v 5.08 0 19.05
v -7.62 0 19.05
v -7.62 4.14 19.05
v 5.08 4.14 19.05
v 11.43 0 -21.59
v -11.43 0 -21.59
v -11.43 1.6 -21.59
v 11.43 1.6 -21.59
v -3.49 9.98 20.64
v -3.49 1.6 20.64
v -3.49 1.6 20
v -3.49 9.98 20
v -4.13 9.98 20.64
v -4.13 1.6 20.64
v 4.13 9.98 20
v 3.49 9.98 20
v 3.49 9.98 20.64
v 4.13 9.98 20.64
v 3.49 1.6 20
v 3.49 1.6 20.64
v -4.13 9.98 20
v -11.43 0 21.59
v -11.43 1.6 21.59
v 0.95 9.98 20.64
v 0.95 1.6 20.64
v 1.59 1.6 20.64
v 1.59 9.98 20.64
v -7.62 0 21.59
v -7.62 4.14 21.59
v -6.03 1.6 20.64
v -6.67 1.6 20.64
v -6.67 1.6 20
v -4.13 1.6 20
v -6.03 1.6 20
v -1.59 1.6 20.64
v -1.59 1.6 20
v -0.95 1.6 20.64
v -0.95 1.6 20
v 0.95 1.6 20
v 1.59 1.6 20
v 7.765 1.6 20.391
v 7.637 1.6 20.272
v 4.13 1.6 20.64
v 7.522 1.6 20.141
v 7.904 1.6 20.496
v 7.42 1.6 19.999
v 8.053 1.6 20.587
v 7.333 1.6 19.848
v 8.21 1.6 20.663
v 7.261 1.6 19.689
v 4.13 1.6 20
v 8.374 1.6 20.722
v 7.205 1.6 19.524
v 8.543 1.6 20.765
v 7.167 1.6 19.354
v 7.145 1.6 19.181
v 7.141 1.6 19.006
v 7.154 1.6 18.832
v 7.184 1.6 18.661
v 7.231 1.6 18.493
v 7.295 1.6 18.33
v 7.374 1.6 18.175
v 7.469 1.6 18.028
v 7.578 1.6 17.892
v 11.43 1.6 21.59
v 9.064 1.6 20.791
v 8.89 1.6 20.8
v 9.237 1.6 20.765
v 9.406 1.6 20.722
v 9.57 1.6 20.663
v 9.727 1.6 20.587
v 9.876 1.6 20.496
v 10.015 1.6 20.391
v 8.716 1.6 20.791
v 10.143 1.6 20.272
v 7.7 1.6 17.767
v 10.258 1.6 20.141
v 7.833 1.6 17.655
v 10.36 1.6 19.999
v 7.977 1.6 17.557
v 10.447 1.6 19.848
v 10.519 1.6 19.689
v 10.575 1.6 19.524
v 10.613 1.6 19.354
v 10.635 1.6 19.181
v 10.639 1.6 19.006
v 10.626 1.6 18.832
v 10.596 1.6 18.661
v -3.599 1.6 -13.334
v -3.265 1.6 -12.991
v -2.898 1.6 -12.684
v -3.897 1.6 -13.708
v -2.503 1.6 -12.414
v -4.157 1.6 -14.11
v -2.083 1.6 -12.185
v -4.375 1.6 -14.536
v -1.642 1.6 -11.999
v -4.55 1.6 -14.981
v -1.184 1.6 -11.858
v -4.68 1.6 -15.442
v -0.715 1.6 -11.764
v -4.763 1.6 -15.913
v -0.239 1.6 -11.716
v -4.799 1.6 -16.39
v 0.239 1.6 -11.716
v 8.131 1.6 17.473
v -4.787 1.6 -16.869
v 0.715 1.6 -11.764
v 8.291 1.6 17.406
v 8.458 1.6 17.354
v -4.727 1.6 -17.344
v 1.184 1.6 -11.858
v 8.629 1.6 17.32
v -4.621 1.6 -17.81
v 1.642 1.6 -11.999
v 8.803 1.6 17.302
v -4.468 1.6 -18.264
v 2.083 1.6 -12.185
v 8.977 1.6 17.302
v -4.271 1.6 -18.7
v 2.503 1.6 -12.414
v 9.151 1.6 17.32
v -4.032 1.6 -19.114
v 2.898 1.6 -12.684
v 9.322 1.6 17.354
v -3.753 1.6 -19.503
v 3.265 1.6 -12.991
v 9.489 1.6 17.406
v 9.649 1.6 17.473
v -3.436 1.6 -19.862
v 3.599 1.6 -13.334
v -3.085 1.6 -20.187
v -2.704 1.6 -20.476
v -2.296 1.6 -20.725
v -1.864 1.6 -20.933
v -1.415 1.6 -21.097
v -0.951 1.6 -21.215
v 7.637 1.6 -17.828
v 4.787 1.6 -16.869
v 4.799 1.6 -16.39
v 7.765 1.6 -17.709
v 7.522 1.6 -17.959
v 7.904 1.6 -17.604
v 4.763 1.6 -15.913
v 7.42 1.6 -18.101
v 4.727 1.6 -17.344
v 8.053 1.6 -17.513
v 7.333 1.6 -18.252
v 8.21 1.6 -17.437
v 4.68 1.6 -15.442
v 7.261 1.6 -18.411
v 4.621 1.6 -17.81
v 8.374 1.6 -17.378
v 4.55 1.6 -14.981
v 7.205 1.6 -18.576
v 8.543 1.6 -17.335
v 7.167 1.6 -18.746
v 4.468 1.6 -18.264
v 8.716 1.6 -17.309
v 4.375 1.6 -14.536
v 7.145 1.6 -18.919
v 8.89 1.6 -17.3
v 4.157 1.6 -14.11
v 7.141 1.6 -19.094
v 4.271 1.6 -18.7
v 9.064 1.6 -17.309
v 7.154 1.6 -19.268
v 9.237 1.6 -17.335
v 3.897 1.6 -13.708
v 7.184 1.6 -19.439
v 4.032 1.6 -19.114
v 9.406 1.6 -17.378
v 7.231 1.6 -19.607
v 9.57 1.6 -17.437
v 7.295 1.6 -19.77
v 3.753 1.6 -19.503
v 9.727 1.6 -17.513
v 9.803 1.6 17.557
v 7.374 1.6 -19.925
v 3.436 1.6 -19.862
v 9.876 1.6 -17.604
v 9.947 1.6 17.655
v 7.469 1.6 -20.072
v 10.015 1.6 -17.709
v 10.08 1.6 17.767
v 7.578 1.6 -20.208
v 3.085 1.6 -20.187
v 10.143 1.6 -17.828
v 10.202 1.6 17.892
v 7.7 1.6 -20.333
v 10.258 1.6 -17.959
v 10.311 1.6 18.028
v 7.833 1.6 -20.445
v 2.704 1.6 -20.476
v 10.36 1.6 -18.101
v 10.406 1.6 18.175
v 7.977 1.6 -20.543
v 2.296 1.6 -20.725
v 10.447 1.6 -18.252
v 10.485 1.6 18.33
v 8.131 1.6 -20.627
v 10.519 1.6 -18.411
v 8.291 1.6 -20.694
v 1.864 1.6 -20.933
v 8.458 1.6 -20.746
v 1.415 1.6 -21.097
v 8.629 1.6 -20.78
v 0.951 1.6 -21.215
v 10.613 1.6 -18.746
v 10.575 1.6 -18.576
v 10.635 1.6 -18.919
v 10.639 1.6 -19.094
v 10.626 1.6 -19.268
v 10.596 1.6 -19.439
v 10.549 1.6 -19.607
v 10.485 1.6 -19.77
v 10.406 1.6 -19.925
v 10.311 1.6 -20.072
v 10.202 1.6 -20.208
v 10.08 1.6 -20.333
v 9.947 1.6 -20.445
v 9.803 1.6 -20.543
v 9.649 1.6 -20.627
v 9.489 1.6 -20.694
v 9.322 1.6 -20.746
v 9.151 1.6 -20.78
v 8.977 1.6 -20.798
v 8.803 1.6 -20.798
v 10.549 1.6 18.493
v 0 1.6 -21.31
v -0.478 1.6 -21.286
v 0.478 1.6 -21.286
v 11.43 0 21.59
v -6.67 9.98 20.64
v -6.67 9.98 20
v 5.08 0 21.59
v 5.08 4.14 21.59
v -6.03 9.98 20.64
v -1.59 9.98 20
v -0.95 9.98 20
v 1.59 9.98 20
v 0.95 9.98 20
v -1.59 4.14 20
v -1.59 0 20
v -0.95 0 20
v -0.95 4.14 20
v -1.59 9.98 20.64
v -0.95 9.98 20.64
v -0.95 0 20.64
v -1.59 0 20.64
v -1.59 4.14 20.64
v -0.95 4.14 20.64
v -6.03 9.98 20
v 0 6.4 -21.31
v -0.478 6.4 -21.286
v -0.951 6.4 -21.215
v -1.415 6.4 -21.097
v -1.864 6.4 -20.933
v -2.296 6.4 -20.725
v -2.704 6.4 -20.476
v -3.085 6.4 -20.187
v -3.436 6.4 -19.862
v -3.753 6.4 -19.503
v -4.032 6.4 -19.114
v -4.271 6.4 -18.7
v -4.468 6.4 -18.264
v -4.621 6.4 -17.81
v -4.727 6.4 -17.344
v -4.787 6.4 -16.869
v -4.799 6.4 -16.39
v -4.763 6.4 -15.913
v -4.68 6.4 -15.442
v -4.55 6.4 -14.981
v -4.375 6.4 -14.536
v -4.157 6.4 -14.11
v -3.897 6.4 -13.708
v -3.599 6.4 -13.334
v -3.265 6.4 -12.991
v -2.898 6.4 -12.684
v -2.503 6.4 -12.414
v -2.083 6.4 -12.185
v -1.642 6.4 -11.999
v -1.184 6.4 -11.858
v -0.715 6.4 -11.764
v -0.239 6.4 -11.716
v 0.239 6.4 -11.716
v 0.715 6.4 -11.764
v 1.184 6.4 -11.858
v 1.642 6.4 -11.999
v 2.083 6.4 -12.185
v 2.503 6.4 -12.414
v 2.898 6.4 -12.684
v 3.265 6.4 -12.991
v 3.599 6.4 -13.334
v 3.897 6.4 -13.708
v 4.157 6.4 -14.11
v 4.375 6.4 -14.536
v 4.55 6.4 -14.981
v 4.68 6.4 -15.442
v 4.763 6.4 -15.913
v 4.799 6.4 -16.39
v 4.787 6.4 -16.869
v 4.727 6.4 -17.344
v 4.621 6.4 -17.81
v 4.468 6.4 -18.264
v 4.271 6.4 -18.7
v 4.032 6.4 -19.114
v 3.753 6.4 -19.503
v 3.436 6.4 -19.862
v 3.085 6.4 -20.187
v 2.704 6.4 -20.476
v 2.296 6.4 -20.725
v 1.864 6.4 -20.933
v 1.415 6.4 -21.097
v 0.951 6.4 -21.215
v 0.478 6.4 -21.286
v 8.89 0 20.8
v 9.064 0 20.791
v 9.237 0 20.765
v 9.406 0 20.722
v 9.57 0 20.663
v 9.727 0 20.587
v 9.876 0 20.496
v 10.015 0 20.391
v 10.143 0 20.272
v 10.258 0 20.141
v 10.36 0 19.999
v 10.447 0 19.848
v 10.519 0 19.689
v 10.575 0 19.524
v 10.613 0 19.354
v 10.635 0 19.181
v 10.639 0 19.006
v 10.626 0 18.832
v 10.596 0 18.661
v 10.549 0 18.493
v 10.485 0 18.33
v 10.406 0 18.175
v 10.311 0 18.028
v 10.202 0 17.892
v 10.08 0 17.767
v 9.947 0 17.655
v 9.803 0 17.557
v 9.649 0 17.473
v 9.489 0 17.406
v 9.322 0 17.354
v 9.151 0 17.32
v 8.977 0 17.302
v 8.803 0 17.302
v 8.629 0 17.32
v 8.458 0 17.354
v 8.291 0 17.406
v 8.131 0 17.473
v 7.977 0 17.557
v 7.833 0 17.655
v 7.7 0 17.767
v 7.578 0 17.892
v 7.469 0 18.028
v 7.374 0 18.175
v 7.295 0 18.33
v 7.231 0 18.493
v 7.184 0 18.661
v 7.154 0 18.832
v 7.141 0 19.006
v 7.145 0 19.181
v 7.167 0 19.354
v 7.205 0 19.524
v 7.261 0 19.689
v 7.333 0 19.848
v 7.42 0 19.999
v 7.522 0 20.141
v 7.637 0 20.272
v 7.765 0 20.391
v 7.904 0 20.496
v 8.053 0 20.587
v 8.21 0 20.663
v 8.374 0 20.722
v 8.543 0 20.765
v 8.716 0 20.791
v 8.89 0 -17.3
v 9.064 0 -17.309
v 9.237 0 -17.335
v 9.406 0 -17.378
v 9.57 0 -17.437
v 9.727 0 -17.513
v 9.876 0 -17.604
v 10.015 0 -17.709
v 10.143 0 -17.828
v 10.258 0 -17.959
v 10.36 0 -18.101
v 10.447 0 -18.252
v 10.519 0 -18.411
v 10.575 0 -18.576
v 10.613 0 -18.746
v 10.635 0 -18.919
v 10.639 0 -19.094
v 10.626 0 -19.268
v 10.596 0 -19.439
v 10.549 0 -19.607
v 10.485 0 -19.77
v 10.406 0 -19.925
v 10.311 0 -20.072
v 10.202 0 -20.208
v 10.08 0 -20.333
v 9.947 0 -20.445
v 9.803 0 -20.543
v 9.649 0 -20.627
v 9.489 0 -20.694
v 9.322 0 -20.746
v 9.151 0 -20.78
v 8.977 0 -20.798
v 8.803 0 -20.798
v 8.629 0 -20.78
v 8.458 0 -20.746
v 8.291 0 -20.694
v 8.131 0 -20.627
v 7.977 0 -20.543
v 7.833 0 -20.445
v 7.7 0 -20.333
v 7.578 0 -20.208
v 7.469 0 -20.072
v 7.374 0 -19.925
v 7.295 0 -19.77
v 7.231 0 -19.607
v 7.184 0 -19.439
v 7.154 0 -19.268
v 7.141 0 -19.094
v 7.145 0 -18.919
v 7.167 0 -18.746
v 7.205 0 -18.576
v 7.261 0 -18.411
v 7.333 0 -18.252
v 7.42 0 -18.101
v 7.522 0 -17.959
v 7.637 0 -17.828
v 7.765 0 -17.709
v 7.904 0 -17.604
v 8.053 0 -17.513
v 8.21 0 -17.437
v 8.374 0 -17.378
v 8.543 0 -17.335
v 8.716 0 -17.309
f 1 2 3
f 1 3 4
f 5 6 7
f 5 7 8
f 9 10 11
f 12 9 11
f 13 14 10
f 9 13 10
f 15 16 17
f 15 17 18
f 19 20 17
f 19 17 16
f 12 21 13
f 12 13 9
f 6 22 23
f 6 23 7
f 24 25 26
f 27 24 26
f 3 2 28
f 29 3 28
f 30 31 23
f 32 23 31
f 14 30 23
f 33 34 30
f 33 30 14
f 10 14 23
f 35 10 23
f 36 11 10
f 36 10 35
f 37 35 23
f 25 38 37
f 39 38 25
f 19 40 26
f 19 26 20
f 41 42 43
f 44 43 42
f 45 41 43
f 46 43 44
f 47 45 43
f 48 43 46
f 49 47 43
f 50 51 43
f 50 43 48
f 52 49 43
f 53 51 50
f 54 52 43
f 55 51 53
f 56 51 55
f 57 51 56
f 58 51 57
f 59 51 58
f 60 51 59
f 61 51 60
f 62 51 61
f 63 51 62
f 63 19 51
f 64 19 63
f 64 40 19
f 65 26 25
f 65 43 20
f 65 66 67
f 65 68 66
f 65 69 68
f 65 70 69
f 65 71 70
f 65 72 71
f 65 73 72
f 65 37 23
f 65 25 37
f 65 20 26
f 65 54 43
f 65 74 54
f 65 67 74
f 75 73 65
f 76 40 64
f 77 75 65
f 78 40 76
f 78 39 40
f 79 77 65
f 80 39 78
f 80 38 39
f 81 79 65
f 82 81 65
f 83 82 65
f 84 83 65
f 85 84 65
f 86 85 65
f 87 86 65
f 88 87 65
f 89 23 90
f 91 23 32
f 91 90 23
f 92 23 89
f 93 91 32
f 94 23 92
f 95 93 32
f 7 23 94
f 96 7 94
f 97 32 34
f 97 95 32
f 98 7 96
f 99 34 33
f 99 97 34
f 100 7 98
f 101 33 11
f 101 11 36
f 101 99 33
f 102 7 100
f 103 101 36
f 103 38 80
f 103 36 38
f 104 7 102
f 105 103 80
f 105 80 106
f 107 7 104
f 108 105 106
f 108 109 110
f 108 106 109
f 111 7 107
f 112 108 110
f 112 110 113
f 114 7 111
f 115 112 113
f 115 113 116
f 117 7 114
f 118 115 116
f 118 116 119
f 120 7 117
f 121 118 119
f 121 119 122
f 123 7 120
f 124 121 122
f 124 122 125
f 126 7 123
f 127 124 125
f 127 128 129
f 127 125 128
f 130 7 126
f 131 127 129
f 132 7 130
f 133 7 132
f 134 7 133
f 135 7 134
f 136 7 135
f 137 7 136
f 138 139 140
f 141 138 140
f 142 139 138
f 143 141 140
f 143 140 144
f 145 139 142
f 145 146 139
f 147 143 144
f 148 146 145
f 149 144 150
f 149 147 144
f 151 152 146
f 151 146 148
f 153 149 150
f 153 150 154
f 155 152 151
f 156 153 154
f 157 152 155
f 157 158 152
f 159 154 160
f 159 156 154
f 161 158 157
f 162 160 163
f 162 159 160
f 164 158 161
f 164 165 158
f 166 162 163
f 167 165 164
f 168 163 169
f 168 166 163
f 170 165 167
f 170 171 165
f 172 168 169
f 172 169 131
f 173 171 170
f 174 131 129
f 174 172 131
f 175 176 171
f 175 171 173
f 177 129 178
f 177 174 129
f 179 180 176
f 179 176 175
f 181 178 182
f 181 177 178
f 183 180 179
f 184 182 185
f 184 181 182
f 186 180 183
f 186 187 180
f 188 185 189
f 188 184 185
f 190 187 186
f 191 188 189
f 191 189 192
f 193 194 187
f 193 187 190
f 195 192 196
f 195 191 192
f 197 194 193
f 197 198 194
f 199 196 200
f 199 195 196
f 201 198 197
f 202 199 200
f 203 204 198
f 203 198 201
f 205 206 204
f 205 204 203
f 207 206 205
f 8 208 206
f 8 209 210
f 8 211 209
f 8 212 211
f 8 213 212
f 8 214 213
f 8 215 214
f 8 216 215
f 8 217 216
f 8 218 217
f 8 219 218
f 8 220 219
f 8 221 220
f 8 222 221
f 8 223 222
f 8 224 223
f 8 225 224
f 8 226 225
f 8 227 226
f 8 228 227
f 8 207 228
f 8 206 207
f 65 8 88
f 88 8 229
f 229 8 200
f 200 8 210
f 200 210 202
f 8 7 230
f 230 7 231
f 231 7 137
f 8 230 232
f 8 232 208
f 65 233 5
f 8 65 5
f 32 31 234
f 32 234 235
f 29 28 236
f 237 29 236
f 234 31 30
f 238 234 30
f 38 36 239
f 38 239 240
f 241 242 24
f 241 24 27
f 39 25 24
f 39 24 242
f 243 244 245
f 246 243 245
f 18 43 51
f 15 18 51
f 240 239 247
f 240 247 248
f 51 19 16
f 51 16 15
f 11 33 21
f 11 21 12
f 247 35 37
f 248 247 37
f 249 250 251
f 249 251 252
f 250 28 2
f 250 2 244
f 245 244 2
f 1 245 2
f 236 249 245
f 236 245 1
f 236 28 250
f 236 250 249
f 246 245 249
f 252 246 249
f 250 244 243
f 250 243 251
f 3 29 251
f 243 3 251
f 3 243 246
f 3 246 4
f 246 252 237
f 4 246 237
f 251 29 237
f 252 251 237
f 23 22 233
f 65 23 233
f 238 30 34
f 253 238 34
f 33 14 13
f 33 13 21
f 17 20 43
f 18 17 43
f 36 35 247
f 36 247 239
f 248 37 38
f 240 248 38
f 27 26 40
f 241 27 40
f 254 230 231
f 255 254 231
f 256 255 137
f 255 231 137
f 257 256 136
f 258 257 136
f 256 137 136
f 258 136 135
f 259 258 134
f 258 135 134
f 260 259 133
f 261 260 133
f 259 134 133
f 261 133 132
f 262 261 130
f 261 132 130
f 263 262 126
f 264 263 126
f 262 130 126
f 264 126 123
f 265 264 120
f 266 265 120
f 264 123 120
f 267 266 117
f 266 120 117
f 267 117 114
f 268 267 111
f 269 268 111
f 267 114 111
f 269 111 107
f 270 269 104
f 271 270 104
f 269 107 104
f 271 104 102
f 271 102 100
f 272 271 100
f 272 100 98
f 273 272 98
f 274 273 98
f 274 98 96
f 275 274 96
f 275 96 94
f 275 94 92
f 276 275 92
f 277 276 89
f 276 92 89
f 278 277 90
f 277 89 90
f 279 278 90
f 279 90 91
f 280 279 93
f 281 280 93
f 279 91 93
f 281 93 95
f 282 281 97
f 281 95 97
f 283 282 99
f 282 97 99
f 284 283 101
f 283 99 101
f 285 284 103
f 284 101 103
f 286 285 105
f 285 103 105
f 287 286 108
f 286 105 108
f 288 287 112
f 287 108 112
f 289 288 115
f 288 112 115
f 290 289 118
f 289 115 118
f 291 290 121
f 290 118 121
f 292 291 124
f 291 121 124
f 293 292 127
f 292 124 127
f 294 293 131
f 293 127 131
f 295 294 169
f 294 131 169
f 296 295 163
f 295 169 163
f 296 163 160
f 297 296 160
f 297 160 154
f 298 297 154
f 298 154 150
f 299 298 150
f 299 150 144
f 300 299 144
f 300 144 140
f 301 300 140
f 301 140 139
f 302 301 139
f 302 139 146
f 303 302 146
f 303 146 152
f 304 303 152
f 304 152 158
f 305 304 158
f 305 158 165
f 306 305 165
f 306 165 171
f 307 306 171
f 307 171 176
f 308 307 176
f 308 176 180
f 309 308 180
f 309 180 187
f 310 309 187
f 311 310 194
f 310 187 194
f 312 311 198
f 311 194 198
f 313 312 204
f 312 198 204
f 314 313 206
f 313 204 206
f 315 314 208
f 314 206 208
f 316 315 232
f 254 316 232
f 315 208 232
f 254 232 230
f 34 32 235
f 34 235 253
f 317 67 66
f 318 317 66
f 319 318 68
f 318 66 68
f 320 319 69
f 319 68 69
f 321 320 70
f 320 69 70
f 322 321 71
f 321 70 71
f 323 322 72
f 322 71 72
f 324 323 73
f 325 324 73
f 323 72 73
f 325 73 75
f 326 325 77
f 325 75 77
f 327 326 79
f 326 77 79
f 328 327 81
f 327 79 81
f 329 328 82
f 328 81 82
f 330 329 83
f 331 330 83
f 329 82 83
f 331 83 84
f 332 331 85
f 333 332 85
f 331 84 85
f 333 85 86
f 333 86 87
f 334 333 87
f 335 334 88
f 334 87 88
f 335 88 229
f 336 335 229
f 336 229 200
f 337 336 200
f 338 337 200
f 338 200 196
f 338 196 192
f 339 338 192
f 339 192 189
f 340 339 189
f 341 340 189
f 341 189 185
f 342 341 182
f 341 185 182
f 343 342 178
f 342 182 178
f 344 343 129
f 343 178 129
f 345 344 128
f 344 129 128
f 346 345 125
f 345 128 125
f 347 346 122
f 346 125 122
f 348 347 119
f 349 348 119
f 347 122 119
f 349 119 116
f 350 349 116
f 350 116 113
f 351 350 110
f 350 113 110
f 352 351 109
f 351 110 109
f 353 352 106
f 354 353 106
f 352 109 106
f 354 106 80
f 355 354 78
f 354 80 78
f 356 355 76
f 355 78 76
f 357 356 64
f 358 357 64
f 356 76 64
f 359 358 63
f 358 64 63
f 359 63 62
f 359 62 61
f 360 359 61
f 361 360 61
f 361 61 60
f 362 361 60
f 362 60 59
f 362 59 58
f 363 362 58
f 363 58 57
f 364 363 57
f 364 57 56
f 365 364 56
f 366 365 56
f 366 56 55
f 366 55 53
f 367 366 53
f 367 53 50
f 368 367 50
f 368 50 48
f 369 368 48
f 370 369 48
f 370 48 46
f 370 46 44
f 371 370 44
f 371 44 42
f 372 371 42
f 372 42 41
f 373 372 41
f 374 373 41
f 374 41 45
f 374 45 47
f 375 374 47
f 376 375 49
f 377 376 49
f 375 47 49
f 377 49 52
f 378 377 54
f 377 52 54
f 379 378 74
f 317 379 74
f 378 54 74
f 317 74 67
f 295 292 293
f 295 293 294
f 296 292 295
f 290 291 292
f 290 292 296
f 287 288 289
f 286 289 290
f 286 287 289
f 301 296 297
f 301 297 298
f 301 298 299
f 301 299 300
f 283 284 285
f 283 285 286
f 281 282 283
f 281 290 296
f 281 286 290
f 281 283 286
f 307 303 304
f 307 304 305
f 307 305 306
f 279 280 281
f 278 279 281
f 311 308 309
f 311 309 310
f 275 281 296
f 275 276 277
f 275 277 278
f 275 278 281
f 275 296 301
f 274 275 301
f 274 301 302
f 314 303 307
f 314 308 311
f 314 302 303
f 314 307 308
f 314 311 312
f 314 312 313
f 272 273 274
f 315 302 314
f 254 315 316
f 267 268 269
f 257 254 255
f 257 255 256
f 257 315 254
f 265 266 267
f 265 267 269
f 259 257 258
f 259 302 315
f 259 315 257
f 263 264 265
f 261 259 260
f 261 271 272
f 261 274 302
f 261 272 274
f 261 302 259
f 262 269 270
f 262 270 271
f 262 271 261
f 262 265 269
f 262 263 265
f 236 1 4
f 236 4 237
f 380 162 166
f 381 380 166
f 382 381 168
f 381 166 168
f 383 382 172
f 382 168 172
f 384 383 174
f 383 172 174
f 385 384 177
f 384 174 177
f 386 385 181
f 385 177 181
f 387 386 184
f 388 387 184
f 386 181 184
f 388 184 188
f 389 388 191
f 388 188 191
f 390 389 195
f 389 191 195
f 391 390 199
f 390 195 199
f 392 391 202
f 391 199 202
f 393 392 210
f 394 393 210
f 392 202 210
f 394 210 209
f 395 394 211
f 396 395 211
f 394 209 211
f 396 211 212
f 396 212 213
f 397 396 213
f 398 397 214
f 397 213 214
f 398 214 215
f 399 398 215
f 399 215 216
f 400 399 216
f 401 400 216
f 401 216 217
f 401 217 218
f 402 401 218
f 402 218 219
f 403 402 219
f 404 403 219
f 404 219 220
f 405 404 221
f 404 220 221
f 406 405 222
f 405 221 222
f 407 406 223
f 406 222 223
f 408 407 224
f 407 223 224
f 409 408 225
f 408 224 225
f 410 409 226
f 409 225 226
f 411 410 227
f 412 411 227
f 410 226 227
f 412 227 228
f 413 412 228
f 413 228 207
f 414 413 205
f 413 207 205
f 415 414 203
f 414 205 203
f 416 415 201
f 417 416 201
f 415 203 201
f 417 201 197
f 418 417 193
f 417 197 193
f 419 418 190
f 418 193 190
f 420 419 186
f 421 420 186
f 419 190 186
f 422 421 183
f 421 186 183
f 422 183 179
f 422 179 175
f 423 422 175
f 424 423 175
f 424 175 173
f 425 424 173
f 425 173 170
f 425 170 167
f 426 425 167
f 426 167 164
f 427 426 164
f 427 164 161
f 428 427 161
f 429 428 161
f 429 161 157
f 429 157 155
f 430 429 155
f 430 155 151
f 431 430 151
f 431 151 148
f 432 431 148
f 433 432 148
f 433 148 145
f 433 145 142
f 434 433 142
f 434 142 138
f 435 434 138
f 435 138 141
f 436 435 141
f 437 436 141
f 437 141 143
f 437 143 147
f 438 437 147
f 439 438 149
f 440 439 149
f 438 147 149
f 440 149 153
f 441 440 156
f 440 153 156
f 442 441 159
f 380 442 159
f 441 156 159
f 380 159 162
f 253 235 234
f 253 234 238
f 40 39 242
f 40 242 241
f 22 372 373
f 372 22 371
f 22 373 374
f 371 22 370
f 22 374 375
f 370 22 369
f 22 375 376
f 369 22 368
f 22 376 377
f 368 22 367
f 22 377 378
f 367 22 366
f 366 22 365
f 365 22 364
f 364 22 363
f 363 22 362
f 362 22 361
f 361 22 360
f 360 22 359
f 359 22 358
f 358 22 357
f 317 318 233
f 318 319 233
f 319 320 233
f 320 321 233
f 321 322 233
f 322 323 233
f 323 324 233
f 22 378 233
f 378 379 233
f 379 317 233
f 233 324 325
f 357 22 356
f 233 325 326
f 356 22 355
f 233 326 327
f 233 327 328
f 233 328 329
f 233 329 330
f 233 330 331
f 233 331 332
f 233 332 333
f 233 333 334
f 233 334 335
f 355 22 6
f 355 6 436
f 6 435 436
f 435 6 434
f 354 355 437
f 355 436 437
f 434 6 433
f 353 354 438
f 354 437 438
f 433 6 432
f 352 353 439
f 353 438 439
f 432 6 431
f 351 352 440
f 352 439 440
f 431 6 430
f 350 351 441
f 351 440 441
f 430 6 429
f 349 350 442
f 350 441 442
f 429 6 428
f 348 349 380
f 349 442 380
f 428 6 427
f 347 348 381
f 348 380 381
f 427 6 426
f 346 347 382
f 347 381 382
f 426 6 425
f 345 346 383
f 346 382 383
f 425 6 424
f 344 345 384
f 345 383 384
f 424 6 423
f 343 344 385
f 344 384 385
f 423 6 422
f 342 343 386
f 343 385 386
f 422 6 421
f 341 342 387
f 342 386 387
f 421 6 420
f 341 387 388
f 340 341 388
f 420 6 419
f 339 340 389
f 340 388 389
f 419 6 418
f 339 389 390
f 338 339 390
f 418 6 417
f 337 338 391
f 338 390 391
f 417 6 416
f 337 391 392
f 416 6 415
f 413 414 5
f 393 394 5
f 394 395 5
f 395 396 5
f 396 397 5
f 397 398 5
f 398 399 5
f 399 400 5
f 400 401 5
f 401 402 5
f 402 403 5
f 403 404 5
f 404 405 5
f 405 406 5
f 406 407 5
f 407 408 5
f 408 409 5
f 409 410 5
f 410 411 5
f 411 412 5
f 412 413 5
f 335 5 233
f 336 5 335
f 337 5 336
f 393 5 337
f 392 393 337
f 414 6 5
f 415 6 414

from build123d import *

# Parameters (mm, degrees)
SKETCH1_W           = 22.86
SKETCH1_H           = 43.18
BOSS_EXTRUDE1_DEPTH = 1.6
SKETCH2_W           = 0.64
SKETCH2_H           = 0.64
BOSS_EXTRUDE2_DEPTH = 8.38
SKETCH3_R           = 1.75
CUT_EXTRUDE1_DEPTH  = 1.6
SKETCH4_R           = 4.8
BOSS_EXTRUDE3_DEPTH = 4.8
SKETCH5_W           = 12.7
SKETCH5_H           = 2.54
SKETCH5_W_2         = 0.64
SKETCH5_H_2         = 0.64
BOSS_EXTRUDE4_DEPTH = 4.14


with BuildPart() as part:
    # Sketch1 → Boss-Extrude1 (new body)
    with BuildSketch(Plane(origin=(0, 0, 0), x_dir=(1, 0, 0), z_dir=(0, 1, 0))):
        Rectangle(SKETCH1_W, SKETCH1_H)
    extrude(amount=BOSS_EXTRUDE1_DEPTH)

    # Sketch2 → Boss-Extrude2 (add)
    with BuildSketch(Plane(origin=(0, 1.6, 0), x_dir=(1, 0, 0), z_dir=(0, 1, 0))):
        with Locations((-3.81, -20.32)):
            Rectangle(SKETCH2_W, SKETCH2_H)
        with Locations((-6.35, -20.32)):
            Rectangle(SKETCH2_W, SKETCH2_H)
        with Locations((-1.27, -20.32)):
            Rectangle(SKETCH2_W, SKETCH2_H)
        with Locations((1.27, -20.32)):
            Rectangle(SKETCH2_W, SKETCH2_H)
        with Locations((3.81, -20.32)):
            Rectangle(SKETCH2_W, SKETCH2_H)
    extrude(amount=BOSS_EXTRUDE2_DEPTH)

    # Sketch3 → Cut-Extrude1 (cut)
    with BuildSketch(Plane(origin=(0, 1.6, 0), x_dir=(1, 0, 0), z_dir=(0, 1, 0))):
        with Locations(Location((8.89, 19.05, 0), (0, 0, 270))):
            Circle(SKETCH3_R)
        with Locations(Location((8.89, -19.05, 0), (0, 0, 270))):
            Circle(SKETCH3_R)
    extrude(amount=-CUT_EXTRUDE1_DEPTH, mode=Mode.SUBTRACT)

    # Sketch4 → Boss-Extrude3 (add)
    with BuildSketch(Plane(origin=(0, 1.6, 0), x_dir=(1, 0, 0), z_dir=(0, 1, 0))):
        with Locations(Location((0, 16.51, 0), (0, 0, 90))):
            Circle(SKETCH4_R)
    extrude(amount=BOSS_EXTRUDE3_DEPTH)


with BuildPart() as body_2:
    # Sketch5 → Boss-Extrude4 (new body)
    with BuildSketch(Plane.XZ):
        with Locations((-1.27, 20.32)):
            Rectangle(SKETCH5_W, SKETCH5_H)
        with Locations((-1.27, 20.32)):
            Rectangle(SKETCH5_W_2, SKETCH5_H_2, mode=Mode.SUBTRACT)
    extrude(amount=-BOSS_EXTRUDE4_DEPTH)


solid = Compound([part.part, body_2.part])
